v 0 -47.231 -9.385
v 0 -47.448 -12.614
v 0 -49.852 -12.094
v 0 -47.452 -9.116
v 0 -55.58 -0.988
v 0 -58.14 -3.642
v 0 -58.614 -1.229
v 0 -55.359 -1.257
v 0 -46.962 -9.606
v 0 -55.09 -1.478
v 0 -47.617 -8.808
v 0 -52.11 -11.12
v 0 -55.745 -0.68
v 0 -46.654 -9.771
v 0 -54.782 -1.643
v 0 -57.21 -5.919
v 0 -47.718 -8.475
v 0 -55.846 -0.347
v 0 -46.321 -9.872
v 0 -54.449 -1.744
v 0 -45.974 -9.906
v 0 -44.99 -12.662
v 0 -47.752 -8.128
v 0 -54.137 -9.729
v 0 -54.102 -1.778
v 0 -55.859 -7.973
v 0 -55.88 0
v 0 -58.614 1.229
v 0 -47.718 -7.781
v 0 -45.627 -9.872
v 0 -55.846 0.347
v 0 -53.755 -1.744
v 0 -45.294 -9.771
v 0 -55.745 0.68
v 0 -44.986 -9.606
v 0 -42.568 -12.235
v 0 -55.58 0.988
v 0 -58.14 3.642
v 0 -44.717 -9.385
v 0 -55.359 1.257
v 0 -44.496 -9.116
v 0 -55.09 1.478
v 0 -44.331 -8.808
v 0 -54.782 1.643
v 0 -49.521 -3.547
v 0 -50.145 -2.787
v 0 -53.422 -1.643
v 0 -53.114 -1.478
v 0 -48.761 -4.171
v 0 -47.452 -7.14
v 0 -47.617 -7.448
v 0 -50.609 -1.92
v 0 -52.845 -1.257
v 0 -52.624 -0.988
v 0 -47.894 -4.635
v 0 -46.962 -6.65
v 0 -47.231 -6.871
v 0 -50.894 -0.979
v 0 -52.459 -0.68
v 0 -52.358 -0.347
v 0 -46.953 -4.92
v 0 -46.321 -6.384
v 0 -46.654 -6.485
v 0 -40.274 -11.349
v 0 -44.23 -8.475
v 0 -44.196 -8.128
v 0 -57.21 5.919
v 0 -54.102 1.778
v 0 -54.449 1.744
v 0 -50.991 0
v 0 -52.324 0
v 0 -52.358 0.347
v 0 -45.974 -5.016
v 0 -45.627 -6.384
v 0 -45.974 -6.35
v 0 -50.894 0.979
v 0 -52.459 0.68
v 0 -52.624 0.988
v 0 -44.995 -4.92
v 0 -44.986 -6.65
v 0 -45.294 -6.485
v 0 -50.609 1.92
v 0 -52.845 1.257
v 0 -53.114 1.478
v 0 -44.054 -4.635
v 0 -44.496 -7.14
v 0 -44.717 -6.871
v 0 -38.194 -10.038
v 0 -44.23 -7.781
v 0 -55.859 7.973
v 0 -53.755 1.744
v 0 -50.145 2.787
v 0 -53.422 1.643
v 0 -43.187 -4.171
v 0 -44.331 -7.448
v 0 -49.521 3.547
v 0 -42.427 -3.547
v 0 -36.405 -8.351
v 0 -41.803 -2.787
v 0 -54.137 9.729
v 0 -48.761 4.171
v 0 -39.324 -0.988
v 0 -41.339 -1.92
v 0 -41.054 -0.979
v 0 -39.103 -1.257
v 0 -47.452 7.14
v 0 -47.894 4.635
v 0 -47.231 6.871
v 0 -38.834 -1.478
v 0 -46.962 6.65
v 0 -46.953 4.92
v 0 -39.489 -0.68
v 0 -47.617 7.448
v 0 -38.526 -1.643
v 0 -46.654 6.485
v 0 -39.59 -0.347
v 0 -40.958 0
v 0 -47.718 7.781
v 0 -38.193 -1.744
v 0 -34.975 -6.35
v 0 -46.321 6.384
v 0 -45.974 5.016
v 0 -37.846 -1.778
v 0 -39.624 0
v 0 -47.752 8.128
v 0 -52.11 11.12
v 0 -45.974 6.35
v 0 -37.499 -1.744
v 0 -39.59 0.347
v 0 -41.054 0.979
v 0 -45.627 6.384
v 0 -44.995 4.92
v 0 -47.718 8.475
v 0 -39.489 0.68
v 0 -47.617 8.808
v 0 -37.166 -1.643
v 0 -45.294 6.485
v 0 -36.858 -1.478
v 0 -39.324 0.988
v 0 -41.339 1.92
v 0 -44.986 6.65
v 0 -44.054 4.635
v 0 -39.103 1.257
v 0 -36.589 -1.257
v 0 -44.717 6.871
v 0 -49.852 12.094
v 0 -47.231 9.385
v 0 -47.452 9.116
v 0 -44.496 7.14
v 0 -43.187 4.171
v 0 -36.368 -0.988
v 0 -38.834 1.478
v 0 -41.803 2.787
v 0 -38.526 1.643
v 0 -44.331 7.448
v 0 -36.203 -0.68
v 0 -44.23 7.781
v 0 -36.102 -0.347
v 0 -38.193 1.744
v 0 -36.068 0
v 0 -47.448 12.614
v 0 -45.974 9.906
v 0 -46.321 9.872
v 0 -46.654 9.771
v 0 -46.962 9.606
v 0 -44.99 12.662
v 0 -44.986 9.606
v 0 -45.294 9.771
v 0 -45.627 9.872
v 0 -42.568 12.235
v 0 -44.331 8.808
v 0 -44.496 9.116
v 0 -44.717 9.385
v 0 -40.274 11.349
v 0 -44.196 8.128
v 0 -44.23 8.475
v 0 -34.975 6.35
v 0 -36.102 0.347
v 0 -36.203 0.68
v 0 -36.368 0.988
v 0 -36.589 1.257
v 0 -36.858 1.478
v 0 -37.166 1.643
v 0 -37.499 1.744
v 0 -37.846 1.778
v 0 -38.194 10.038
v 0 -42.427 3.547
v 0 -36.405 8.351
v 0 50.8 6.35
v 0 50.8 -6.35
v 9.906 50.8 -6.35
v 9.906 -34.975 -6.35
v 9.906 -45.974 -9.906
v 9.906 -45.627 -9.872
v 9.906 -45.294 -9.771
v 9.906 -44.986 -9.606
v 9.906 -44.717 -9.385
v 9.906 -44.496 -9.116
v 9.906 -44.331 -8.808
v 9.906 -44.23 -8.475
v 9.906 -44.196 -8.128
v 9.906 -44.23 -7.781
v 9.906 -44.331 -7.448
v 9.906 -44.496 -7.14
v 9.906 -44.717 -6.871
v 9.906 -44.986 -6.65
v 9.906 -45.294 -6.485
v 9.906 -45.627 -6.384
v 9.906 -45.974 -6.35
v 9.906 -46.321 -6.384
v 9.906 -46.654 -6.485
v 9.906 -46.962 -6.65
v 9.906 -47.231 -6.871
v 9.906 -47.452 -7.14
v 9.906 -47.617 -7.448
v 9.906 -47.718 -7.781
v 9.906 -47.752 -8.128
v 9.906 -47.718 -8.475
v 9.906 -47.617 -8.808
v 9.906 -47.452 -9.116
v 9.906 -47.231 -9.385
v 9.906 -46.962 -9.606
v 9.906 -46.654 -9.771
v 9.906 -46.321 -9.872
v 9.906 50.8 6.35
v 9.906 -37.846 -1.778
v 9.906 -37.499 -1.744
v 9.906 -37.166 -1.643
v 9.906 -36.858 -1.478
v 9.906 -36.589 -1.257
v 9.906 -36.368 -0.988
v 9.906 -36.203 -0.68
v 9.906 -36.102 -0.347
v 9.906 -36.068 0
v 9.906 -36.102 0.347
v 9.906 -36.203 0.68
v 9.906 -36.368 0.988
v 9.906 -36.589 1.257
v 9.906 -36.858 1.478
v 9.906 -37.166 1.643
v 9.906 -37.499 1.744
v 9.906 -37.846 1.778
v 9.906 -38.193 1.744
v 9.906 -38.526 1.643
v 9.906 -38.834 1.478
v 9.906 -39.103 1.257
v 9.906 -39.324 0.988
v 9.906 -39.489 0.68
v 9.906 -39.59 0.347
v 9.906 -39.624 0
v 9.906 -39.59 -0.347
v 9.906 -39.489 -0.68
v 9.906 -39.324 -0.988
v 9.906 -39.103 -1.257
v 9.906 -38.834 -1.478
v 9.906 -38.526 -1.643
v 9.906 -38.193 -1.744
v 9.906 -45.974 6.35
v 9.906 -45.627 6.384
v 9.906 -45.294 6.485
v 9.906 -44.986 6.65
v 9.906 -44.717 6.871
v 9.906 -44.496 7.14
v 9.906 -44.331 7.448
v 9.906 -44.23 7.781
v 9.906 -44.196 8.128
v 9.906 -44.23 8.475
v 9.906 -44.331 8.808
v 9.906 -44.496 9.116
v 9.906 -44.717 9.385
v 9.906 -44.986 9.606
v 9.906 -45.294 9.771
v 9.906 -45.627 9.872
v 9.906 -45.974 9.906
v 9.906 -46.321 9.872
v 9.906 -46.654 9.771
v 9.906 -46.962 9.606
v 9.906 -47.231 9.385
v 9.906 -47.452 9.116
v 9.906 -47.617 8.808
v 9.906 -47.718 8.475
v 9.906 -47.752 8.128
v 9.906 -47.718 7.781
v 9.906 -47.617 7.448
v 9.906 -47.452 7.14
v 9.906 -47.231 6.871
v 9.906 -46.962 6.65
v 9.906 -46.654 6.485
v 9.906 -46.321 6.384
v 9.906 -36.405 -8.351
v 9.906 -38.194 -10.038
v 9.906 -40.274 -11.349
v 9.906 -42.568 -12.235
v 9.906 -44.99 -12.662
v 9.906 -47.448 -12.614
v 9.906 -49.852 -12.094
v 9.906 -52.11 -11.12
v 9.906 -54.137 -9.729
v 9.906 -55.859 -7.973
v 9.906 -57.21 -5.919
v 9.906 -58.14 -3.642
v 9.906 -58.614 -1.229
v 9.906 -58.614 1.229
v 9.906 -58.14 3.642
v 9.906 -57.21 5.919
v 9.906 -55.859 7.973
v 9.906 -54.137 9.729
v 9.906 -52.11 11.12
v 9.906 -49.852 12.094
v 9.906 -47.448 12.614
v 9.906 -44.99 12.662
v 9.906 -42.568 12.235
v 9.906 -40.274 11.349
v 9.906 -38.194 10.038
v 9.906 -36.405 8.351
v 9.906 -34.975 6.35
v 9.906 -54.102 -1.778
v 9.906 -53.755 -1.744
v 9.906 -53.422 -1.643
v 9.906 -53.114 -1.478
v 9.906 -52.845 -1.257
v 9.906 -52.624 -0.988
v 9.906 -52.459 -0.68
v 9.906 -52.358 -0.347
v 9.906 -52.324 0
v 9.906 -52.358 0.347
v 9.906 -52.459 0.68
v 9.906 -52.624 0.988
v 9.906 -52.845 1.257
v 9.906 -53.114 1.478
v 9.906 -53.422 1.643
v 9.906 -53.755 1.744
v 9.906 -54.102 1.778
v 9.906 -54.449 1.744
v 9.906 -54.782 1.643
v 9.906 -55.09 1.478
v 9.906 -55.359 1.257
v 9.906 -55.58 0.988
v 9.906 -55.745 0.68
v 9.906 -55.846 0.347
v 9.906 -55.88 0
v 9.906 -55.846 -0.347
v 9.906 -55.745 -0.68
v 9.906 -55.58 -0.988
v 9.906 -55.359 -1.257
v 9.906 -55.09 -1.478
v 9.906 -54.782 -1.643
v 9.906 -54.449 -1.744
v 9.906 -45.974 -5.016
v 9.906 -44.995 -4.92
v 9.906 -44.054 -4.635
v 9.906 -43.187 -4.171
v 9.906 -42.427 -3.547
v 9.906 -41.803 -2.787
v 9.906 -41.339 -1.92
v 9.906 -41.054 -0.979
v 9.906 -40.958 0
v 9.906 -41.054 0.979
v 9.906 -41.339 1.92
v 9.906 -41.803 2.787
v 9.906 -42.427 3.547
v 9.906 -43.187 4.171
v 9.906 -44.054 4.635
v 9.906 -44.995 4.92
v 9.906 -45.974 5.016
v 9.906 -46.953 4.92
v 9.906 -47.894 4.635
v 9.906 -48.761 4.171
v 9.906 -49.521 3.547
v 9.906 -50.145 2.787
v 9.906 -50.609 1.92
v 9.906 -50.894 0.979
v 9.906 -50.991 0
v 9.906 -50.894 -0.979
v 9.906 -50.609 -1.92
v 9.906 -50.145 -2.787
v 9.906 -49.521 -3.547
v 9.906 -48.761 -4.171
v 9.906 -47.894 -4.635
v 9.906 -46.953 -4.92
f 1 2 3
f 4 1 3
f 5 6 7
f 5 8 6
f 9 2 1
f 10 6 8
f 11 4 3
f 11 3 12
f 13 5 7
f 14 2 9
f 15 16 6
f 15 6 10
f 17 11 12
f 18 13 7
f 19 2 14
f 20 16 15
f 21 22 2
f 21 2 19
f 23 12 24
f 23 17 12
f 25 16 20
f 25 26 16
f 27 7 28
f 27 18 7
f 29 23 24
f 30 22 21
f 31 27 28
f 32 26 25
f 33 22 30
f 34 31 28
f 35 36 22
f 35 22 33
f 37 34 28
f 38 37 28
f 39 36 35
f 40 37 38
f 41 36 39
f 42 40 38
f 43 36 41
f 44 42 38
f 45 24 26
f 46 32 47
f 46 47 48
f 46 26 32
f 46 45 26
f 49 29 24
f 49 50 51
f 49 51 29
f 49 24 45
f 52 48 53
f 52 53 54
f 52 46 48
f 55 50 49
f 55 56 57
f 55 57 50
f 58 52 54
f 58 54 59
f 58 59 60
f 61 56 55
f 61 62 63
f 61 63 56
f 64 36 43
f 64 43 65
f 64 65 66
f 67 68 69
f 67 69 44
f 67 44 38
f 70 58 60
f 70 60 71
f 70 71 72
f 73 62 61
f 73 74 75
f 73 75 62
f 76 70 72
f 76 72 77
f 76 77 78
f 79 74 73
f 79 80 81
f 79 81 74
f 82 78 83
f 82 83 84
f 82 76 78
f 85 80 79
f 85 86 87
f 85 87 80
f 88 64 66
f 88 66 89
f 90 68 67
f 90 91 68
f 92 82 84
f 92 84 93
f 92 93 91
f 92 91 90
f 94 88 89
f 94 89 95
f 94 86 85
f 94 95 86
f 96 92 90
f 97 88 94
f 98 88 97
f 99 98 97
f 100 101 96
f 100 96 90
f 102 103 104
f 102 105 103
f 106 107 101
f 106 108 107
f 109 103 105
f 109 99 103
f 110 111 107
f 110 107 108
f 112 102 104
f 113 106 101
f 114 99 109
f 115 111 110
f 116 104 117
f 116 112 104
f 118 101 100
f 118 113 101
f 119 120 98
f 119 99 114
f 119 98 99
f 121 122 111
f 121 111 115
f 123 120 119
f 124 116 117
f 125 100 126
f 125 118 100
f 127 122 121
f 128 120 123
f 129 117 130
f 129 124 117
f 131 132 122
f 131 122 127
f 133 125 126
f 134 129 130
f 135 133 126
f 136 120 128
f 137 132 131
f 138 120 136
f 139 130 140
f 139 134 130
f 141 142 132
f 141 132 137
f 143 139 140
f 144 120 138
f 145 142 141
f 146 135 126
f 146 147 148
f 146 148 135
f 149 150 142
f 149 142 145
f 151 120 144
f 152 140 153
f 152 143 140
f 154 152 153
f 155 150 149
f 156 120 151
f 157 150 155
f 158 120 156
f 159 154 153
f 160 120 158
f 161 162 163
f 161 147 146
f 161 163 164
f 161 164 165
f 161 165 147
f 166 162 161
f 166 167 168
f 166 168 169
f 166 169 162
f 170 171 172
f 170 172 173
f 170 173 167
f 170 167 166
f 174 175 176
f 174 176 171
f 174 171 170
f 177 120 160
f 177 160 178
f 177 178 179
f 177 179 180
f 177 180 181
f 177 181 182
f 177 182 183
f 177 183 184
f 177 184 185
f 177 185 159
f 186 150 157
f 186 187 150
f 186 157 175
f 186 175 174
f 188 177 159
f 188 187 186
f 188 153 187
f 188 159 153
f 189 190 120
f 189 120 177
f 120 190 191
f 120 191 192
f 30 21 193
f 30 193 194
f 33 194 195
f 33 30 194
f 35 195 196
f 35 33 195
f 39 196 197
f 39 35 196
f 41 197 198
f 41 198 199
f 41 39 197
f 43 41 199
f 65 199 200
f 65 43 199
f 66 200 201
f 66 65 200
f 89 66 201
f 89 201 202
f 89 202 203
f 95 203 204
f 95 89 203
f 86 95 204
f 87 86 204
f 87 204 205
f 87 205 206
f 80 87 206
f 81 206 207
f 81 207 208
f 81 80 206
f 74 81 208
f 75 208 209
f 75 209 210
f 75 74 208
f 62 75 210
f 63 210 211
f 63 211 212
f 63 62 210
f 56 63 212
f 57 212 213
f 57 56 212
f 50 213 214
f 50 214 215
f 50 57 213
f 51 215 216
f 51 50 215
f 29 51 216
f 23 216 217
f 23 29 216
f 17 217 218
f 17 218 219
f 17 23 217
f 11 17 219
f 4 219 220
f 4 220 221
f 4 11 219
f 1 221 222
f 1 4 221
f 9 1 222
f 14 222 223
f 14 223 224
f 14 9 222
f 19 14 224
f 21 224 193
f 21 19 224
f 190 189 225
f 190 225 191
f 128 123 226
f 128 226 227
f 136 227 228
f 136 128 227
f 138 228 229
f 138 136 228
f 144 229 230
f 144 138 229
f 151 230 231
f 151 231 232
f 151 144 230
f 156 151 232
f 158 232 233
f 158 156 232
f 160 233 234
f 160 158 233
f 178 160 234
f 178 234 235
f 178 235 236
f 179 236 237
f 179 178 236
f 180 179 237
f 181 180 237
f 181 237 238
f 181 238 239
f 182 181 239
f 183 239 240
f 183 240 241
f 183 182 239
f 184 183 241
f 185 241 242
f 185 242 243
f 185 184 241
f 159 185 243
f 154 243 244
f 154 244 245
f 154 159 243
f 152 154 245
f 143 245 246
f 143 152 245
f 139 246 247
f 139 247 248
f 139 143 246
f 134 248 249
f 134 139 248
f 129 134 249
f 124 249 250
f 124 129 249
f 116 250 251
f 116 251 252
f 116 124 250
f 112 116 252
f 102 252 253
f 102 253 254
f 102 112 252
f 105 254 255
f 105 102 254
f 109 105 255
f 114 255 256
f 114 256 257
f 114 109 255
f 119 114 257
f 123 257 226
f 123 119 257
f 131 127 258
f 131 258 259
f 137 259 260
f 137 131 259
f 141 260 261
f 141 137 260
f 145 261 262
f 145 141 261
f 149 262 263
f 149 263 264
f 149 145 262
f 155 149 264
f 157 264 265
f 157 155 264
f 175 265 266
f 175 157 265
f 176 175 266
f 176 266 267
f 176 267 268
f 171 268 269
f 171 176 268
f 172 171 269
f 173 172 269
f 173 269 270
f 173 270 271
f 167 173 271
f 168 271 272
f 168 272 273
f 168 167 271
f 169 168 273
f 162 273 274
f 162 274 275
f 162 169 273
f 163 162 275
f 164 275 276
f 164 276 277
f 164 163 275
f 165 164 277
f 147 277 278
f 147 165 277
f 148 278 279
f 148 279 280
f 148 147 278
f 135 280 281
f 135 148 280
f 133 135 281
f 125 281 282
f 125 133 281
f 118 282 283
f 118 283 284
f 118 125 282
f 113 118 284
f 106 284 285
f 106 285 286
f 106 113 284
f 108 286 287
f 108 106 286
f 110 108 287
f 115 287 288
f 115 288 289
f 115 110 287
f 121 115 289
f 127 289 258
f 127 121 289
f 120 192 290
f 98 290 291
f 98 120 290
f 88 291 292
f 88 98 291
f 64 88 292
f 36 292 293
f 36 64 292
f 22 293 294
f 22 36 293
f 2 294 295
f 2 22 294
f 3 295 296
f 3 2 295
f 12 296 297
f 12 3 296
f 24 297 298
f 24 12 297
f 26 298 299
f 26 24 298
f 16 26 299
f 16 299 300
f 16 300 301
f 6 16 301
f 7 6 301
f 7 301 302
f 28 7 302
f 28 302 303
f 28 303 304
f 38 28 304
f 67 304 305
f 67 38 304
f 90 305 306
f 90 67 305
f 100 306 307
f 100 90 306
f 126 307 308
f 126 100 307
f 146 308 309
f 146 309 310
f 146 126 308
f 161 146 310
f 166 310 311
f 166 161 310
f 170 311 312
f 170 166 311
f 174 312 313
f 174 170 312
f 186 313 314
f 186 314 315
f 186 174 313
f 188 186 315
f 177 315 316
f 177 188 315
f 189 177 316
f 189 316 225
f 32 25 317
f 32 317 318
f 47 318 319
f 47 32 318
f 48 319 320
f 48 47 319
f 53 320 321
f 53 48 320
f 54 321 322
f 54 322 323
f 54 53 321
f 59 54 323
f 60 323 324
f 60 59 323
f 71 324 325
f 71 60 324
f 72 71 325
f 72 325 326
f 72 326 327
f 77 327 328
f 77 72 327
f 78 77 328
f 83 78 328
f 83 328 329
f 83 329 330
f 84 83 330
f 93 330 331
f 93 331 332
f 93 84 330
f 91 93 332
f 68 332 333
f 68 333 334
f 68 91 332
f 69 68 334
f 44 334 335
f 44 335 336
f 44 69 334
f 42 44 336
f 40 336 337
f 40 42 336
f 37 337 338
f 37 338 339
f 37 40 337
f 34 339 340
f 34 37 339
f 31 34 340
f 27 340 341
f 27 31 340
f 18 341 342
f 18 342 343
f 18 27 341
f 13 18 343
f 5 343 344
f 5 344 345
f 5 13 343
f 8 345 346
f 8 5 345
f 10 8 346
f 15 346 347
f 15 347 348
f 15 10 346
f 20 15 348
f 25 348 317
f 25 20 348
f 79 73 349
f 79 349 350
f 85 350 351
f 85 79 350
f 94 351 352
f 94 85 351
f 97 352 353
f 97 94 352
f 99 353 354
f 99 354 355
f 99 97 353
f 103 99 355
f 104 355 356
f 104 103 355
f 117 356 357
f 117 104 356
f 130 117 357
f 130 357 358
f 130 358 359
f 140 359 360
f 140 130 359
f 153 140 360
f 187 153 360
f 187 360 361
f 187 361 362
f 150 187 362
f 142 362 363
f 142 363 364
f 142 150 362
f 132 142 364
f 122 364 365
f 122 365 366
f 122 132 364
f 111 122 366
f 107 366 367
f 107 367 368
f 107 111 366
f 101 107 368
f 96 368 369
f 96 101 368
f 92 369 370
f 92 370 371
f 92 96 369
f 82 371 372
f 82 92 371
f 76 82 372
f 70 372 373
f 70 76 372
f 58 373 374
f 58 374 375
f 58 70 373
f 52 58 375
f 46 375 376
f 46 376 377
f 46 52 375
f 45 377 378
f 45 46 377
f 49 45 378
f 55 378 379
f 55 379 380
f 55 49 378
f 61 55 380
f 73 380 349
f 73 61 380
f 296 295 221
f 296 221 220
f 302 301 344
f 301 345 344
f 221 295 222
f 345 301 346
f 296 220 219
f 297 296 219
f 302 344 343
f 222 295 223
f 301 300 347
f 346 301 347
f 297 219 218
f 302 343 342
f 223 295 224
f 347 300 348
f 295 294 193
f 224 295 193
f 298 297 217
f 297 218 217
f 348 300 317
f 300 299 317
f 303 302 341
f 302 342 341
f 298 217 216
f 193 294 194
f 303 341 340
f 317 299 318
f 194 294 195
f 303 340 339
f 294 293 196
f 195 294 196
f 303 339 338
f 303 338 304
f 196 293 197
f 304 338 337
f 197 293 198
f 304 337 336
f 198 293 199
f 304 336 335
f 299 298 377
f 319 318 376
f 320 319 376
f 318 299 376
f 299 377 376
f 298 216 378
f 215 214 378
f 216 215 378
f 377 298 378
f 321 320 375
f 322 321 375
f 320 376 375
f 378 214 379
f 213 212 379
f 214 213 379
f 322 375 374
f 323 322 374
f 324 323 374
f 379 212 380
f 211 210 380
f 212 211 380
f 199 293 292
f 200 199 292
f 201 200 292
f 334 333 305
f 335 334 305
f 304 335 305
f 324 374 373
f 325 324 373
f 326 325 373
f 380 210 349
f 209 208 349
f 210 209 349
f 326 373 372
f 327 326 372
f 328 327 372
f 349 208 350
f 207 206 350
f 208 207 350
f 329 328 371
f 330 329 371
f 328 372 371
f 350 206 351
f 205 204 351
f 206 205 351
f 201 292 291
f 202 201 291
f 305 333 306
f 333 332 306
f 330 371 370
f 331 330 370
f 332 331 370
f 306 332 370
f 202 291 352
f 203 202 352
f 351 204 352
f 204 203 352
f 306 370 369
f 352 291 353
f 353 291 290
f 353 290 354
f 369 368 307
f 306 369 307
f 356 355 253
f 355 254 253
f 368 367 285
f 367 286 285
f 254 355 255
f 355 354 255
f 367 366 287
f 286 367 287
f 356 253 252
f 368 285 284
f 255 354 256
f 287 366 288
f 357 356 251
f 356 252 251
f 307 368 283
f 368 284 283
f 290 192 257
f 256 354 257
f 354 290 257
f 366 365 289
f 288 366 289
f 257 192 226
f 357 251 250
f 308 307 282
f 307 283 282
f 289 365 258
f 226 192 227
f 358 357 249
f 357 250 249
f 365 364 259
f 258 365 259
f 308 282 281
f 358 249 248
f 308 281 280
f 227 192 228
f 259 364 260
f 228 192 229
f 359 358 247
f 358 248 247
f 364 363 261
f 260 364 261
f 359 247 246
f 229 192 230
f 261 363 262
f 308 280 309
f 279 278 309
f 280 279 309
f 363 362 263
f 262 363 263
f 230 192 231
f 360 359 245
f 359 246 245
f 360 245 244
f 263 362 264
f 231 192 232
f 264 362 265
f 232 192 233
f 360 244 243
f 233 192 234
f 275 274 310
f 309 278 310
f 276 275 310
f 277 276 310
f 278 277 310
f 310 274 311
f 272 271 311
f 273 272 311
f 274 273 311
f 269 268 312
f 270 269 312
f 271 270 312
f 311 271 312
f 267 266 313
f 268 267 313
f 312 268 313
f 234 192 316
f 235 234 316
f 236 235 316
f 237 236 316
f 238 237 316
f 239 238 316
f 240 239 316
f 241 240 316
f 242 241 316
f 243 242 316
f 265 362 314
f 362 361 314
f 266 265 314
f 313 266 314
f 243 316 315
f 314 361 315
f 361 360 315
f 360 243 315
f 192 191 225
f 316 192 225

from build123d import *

# Parameters (mm, degrees)
SKETCH1_R           = 5.0165
SKETCH1_R_2         = 1.778
BOSS_EXTRUDE1_DEPTH = 9.906


with BuildPart() as part:
    # Sketch1 → Boss-Extrude1 (new body)
    with BuildSketch(Plane(origin=(0, 0, 0), x_dir=(0, 0, -1), z_dir=(1, 0, 0))):
        with BuildLine():
            Line((-6.35, -34.97547742), (-6.35, 50.8))
            Line((-6.35, 50.8), (6.35, 50.8))
            Line((6.35, 50.8), (6.35, -34.97547742))
            ThreePointArc((6.35, -34.97547742), (0, -58.674000048), (-6.35, -34.97547742))
        make_face()
        with Locations((0, -45.974000048)):
            Circle(SKETCH1_R, mode=Mode.SUBTRACT)
        with Locations((-8.128, -45.974000048)):
            Circle(SKETCH1_R_2, mode=Mode.SUBTRACT)
        with Locations((0, -37.846000048)):
            Circle(SKETCH1_R_2, mode=Mode.SUBTRACT)
        with Locations((8.128, -45.974000048)):
            Circle(SKETCH1_R_2, mode=Mode.SUBTRACT)
        with Locations((0, -54.102000048)):
            Circle(SKETCH1_R_2, mode=Mode.SUBTRACT)
    extrude(amount=BOSS_EXTRUDE1_DEPTH)


solid = part.part
